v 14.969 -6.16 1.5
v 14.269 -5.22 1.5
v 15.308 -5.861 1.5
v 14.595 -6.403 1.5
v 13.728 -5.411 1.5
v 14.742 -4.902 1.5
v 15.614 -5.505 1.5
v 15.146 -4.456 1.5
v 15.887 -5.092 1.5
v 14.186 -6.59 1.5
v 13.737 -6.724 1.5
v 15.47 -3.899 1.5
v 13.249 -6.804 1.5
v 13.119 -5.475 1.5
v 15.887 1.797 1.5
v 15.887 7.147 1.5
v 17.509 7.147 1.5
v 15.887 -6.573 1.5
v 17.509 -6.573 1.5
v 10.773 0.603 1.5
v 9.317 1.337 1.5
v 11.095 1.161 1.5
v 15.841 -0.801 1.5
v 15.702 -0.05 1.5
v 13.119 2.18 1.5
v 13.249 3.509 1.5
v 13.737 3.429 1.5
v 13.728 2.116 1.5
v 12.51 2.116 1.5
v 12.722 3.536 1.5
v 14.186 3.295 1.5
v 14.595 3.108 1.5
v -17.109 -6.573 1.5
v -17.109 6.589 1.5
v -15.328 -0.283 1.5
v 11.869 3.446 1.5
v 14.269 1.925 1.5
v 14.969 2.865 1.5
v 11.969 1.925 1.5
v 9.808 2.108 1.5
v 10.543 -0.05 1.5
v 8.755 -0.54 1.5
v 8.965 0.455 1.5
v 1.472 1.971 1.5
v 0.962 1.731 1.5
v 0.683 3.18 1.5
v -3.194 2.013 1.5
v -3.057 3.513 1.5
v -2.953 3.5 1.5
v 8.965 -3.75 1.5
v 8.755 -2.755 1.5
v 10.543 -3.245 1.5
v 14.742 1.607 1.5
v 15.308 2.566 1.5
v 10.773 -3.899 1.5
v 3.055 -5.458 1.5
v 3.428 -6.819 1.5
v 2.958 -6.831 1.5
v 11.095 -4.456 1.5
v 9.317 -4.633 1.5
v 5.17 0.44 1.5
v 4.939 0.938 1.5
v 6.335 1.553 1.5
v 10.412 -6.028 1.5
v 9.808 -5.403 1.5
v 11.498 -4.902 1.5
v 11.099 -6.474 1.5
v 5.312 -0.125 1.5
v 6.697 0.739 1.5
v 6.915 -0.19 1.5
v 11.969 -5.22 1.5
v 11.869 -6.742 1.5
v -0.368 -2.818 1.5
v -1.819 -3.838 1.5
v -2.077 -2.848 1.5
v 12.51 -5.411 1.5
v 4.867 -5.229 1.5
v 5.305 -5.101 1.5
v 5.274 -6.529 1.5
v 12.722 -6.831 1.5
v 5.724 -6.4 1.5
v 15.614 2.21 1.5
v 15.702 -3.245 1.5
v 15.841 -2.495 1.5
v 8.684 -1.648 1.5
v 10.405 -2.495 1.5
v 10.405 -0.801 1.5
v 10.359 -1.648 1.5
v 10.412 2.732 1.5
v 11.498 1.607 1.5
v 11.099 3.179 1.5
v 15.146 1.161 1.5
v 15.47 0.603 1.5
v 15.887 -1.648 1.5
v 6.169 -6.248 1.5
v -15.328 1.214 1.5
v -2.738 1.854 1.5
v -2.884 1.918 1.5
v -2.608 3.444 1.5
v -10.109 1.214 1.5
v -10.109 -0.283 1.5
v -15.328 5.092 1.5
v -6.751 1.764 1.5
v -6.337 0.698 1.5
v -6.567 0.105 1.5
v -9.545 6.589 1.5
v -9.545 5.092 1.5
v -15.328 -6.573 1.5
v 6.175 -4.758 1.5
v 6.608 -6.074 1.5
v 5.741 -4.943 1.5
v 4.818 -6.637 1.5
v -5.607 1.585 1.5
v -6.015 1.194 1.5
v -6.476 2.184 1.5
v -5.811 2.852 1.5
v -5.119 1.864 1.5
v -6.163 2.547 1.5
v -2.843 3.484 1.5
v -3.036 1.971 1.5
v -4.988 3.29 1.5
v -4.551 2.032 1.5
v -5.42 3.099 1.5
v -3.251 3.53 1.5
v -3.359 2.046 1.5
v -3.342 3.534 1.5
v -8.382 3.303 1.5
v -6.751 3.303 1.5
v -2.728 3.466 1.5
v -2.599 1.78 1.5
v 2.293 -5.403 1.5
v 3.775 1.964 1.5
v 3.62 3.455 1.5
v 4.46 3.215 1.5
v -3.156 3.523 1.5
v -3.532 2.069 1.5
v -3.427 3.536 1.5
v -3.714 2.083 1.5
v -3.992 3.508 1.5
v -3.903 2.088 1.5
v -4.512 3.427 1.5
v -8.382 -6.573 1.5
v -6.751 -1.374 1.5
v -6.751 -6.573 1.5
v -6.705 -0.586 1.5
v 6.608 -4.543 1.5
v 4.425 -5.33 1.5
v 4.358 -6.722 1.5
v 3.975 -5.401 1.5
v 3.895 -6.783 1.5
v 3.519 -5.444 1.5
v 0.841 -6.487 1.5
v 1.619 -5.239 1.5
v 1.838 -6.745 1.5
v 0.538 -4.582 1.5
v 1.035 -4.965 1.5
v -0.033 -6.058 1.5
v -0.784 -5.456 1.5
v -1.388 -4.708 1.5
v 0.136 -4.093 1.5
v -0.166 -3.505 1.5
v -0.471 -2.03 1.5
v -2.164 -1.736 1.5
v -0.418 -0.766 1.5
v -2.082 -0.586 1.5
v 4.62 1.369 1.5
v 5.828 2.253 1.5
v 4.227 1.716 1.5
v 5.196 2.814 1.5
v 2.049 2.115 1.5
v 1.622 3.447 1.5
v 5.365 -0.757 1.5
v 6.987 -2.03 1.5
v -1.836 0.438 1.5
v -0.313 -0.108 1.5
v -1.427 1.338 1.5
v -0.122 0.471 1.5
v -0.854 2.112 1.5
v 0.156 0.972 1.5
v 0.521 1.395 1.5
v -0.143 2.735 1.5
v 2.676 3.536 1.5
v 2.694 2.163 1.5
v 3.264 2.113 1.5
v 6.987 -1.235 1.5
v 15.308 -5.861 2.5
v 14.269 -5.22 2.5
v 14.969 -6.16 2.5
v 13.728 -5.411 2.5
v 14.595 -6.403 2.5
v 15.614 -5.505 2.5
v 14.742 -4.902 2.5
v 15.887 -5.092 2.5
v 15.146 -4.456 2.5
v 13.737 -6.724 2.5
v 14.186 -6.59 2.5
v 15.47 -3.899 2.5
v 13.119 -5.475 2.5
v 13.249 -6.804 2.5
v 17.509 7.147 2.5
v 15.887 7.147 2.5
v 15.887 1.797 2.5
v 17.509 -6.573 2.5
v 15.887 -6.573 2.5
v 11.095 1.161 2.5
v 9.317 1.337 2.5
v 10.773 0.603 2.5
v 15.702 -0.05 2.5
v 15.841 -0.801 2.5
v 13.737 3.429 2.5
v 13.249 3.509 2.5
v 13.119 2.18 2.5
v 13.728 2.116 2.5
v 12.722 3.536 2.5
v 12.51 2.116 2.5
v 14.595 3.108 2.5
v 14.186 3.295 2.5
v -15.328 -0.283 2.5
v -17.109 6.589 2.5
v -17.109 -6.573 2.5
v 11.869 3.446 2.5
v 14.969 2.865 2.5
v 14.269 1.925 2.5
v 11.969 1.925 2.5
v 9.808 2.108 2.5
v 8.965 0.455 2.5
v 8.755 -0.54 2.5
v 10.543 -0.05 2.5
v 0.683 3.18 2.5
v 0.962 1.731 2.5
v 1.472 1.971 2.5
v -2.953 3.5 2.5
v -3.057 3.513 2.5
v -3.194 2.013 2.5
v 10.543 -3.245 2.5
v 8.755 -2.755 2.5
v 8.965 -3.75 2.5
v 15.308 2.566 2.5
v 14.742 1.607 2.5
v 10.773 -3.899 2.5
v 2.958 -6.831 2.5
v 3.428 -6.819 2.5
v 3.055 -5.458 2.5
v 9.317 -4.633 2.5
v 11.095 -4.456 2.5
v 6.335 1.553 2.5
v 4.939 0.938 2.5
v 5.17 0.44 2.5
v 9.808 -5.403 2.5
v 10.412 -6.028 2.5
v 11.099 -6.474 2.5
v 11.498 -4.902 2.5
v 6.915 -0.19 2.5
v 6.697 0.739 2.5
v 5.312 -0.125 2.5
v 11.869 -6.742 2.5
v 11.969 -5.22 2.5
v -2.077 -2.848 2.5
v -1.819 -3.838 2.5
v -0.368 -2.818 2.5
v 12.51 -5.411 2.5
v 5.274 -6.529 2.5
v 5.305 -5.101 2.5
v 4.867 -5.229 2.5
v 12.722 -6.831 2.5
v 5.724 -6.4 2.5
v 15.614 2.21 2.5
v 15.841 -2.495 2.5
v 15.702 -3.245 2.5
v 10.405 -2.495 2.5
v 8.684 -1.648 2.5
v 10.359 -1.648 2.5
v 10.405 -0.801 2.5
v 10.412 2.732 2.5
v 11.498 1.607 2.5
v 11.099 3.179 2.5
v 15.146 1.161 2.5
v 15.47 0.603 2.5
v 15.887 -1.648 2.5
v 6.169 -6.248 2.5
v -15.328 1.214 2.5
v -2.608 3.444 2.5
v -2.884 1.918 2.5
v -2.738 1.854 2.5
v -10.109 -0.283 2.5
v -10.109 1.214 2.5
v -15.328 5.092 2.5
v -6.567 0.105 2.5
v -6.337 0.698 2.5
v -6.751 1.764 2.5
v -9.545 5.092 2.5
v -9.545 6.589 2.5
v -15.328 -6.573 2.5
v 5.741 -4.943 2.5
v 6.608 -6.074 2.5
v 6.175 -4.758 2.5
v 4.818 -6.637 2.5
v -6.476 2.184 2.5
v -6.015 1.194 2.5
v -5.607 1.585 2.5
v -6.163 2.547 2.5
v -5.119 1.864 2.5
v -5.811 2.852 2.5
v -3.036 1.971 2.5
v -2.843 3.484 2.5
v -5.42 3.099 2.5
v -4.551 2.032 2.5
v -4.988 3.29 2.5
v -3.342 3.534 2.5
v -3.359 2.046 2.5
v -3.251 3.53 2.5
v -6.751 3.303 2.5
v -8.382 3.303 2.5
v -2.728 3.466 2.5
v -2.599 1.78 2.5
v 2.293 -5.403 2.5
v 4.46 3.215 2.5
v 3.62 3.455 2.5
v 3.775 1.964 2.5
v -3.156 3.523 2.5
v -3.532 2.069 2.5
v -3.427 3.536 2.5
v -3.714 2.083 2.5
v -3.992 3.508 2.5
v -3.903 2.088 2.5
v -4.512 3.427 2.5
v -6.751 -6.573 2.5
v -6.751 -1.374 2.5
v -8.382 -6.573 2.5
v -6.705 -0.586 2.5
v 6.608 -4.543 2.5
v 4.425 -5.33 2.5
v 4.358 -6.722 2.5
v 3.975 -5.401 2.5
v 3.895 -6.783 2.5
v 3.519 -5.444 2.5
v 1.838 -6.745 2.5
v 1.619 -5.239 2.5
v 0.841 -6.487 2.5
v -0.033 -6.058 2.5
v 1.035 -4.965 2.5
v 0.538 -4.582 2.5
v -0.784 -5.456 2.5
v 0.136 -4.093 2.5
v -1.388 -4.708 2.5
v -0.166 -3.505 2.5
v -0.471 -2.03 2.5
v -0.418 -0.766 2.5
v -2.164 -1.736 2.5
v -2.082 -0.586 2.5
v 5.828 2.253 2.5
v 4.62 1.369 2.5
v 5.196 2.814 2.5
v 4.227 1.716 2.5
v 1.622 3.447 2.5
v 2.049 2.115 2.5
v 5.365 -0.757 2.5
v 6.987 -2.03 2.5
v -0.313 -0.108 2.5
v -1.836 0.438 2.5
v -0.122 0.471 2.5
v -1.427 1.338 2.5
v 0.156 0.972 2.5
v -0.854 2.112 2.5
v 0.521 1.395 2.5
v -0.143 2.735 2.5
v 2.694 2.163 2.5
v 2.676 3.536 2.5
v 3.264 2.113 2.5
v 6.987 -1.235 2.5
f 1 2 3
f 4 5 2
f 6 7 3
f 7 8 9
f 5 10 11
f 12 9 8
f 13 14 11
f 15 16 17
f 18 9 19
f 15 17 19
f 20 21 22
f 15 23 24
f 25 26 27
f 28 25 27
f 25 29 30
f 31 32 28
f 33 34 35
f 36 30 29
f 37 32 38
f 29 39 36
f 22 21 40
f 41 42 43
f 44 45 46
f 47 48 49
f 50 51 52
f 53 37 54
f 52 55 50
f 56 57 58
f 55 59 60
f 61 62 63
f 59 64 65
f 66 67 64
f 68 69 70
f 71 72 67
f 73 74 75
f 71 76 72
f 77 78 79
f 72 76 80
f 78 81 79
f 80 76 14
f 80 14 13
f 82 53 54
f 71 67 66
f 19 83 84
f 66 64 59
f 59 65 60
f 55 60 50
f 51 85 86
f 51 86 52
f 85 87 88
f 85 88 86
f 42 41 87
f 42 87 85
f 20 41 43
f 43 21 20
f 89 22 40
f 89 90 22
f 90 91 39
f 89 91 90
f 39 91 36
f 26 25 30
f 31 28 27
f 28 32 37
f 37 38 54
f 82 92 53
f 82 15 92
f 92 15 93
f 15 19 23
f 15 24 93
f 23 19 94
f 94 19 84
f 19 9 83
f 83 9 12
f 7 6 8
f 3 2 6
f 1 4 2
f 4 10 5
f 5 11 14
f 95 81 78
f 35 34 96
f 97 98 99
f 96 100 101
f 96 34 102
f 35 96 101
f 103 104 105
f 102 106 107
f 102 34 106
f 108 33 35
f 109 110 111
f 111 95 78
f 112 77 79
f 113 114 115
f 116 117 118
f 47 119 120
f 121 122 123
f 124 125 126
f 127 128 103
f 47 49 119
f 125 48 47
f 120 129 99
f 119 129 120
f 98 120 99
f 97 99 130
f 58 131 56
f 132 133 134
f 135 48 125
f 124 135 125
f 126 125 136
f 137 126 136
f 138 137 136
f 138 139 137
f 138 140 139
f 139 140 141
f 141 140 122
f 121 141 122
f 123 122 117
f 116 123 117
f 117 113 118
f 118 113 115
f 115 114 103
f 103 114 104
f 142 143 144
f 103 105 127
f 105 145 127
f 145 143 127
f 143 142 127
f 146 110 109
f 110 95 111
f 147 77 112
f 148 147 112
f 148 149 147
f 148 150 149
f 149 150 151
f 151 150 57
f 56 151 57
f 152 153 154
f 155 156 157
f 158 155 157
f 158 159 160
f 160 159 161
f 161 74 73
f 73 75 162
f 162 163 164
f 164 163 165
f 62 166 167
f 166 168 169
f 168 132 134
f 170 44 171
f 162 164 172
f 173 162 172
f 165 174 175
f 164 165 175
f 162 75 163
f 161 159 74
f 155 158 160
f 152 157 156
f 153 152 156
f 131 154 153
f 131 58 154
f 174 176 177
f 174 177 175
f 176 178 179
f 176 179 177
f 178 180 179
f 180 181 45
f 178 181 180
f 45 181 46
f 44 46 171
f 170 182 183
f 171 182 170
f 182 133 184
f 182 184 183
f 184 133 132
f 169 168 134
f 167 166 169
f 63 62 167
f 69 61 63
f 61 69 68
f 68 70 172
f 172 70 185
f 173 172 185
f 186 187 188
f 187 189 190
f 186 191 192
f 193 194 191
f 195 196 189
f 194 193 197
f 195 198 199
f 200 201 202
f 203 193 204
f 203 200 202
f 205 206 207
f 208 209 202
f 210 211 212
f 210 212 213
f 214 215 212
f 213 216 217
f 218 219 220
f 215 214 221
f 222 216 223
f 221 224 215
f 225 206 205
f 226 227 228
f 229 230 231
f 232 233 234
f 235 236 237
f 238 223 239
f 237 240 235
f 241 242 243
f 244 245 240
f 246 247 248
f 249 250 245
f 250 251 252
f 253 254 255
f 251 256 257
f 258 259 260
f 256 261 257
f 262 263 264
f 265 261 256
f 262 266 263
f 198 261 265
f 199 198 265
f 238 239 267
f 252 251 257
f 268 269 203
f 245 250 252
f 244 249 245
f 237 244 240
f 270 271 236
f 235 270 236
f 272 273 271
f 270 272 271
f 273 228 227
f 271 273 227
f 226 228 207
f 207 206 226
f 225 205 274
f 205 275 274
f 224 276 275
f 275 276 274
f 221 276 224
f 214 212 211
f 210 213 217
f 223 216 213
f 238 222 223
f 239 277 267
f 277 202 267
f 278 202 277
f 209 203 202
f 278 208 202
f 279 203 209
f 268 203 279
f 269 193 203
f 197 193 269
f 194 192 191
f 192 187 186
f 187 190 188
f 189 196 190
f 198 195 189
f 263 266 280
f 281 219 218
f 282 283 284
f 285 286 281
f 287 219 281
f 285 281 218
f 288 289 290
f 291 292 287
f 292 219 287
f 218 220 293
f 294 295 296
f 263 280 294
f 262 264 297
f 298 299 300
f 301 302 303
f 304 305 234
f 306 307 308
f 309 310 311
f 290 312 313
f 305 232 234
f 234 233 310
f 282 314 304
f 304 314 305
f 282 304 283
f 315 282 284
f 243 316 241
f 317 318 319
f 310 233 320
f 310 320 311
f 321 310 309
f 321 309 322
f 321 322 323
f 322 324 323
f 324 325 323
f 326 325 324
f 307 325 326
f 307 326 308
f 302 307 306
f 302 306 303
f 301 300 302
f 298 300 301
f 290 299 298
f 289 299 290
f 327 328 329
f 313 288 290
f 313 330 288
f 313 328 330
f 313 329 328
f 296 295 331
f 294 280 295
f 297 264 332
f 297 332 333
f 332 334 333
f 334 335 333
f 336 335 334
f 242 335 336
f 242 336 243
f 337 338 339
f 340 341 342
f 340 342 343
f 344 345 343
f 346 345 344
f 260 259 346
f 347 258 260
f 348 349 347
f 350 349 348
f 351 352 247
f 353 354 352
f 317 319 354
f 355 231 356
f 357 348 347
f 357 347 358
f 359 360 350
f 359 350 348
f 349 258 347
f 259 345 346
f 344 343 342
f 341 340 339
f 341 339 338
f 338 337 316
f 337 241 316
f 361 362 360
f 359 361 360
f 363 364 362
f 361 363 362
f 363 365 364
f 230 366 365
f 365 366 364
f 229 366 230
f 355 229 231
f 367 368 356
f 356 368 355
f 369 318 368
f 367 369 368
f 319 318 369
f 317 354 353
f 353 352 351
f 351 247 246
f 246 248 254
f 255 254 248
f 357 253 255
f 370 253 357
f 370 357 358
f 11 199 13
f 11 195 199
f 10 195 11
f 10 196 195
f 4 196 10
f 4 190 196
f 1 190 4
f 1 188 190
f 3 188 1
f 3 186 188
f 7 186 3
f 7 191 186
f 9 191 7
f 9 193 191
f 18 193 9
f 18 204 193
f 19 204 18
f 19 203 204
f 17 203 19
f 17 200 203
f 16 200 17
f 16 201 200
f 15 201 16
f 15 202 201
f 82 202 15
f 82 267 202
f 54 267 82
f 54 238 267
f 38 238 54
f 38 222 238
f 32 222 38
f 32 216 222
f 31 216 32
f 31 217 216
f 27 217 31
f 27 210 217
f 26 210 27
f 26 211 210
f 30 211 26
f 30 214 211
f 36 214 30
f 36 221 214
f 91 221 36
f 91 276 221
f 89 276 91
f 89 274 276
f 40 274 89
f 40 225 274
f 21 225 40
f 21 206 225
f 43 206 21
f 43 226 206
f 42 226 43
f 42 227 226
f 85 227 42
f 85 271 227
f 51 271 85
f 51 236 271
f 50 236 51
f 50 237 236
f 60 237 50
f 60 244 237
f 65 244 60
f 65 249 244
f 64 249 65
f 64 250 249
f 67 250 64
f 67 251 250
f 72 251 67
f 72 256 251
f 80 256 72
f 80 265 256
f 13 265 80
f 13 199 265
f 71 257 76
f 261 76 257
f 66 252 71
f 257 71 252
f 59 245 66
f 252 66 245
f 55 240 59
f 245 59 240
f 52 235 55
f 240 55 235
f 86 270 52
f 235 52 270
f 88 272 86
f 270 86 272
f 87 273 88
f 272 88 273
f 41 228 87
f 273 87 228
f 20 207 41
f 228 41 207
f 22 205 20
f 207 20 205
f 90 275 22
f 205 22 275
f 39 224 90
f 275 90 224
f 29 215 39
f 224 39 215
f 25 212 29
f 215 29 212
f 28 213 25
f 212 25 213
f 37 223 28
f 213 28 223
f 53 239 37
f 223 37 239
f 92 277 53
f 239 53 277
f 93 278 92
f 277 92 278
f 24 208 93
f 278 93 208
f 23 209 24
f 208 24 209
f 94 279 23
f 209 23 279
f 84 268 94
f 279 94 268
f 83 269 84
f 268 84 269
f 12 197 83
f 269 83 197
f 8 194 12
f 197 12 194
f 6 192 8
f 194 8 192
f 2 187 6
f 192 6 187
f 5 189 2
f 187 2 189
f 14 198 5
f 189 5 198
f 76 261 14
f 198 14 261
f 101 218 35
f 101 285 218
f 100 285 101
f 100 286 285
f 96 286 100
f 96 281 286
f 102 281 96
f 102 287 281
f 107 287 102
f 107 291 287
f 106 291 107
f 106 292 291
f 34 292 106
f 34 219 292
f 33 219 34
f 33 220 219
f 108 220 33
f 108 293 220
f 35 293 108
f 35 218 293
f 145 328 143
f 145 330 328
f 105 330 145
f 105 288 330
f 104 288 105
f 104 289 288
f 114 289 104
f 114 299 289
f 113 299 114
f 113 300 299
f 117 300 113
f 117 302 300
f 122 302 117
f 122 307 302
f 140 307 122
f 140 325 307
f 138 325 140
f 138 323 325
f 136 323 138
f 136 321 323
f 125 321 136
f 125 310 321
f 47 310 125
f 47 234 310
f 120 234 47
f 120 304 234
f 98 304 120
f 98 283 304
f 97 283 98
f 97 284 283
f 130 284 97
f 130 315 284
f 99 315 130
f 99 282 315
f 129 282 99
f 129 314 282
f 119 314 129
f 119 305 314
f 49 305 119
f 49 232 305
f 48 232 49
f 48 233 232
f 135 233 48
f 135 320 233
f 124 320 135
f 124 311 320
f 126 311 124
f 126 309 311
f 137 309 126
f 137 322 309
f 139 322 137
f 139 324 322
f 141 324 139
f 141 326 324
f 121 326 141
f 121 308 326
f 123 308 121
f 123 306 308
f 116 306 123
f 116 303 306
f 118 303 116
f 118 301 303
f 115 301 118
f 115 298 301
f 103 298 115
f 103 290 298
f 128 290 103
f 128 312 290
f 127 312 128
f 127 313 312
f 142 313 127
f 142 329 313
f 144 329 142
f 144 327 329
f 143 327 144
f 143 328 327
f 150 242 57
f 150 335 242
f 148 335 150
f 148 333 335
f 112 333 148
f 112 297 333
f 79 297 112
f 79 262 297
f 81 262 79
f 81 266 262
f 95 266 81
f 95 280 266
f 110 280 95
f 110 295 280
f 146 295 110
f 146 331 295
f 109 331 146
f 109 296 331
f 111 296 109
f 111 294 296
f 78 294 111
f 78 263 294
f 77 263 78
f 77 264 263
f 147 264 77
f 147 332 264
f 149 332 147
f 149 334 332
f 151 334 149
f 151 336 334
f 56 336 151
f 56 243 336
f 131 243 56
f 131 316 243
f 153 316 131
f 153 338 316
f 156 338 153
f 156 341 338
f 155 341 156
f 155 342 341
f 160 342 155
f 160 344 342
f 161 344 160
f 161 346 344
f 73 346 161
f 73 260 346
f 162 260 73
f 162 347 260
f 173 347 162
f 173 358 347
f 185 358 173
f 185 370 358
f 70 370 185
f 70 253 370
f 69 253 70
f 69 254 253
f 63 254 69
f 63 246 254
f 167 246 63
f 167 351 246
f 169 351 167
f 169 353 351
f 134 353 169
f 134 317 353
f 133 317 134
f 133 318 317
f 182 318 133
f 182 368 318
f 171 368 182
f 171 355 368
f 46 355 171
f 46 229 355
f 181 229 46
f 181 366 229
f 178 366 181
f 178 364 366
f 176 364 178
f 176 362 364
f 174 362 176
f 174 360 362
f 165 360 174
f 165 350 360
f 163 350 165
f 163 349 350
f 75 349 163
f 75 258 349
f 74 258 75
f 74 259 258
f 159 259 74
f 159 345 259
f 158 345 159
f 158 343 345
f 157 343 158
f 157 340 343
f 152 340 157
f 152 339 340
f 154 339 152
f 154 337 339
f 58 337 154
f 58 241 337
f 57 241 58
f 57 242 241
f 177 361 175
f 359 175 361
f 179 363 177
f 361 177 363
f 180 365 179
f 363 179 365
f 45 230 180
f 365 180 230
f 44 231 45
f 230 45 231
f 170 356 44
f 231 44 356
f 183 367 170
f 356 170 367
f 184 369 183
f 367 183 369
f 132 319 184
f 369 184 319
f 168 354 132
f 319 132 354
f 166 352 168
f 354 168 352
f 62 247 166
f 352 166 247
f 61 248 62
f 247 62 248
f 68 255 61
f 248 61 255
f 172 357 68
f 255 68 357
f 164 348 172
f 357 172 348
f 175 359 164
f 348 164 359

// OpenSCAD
// Simple test for Fred text rendering
name = "Fred";
text_size = 13;

color("white")
translate([0, 0, 1.5])
    linear_extrude(height=1)
        text(name,
             size=text_size,
             font="Fordscript",
             halign="center",
             valign="center");
